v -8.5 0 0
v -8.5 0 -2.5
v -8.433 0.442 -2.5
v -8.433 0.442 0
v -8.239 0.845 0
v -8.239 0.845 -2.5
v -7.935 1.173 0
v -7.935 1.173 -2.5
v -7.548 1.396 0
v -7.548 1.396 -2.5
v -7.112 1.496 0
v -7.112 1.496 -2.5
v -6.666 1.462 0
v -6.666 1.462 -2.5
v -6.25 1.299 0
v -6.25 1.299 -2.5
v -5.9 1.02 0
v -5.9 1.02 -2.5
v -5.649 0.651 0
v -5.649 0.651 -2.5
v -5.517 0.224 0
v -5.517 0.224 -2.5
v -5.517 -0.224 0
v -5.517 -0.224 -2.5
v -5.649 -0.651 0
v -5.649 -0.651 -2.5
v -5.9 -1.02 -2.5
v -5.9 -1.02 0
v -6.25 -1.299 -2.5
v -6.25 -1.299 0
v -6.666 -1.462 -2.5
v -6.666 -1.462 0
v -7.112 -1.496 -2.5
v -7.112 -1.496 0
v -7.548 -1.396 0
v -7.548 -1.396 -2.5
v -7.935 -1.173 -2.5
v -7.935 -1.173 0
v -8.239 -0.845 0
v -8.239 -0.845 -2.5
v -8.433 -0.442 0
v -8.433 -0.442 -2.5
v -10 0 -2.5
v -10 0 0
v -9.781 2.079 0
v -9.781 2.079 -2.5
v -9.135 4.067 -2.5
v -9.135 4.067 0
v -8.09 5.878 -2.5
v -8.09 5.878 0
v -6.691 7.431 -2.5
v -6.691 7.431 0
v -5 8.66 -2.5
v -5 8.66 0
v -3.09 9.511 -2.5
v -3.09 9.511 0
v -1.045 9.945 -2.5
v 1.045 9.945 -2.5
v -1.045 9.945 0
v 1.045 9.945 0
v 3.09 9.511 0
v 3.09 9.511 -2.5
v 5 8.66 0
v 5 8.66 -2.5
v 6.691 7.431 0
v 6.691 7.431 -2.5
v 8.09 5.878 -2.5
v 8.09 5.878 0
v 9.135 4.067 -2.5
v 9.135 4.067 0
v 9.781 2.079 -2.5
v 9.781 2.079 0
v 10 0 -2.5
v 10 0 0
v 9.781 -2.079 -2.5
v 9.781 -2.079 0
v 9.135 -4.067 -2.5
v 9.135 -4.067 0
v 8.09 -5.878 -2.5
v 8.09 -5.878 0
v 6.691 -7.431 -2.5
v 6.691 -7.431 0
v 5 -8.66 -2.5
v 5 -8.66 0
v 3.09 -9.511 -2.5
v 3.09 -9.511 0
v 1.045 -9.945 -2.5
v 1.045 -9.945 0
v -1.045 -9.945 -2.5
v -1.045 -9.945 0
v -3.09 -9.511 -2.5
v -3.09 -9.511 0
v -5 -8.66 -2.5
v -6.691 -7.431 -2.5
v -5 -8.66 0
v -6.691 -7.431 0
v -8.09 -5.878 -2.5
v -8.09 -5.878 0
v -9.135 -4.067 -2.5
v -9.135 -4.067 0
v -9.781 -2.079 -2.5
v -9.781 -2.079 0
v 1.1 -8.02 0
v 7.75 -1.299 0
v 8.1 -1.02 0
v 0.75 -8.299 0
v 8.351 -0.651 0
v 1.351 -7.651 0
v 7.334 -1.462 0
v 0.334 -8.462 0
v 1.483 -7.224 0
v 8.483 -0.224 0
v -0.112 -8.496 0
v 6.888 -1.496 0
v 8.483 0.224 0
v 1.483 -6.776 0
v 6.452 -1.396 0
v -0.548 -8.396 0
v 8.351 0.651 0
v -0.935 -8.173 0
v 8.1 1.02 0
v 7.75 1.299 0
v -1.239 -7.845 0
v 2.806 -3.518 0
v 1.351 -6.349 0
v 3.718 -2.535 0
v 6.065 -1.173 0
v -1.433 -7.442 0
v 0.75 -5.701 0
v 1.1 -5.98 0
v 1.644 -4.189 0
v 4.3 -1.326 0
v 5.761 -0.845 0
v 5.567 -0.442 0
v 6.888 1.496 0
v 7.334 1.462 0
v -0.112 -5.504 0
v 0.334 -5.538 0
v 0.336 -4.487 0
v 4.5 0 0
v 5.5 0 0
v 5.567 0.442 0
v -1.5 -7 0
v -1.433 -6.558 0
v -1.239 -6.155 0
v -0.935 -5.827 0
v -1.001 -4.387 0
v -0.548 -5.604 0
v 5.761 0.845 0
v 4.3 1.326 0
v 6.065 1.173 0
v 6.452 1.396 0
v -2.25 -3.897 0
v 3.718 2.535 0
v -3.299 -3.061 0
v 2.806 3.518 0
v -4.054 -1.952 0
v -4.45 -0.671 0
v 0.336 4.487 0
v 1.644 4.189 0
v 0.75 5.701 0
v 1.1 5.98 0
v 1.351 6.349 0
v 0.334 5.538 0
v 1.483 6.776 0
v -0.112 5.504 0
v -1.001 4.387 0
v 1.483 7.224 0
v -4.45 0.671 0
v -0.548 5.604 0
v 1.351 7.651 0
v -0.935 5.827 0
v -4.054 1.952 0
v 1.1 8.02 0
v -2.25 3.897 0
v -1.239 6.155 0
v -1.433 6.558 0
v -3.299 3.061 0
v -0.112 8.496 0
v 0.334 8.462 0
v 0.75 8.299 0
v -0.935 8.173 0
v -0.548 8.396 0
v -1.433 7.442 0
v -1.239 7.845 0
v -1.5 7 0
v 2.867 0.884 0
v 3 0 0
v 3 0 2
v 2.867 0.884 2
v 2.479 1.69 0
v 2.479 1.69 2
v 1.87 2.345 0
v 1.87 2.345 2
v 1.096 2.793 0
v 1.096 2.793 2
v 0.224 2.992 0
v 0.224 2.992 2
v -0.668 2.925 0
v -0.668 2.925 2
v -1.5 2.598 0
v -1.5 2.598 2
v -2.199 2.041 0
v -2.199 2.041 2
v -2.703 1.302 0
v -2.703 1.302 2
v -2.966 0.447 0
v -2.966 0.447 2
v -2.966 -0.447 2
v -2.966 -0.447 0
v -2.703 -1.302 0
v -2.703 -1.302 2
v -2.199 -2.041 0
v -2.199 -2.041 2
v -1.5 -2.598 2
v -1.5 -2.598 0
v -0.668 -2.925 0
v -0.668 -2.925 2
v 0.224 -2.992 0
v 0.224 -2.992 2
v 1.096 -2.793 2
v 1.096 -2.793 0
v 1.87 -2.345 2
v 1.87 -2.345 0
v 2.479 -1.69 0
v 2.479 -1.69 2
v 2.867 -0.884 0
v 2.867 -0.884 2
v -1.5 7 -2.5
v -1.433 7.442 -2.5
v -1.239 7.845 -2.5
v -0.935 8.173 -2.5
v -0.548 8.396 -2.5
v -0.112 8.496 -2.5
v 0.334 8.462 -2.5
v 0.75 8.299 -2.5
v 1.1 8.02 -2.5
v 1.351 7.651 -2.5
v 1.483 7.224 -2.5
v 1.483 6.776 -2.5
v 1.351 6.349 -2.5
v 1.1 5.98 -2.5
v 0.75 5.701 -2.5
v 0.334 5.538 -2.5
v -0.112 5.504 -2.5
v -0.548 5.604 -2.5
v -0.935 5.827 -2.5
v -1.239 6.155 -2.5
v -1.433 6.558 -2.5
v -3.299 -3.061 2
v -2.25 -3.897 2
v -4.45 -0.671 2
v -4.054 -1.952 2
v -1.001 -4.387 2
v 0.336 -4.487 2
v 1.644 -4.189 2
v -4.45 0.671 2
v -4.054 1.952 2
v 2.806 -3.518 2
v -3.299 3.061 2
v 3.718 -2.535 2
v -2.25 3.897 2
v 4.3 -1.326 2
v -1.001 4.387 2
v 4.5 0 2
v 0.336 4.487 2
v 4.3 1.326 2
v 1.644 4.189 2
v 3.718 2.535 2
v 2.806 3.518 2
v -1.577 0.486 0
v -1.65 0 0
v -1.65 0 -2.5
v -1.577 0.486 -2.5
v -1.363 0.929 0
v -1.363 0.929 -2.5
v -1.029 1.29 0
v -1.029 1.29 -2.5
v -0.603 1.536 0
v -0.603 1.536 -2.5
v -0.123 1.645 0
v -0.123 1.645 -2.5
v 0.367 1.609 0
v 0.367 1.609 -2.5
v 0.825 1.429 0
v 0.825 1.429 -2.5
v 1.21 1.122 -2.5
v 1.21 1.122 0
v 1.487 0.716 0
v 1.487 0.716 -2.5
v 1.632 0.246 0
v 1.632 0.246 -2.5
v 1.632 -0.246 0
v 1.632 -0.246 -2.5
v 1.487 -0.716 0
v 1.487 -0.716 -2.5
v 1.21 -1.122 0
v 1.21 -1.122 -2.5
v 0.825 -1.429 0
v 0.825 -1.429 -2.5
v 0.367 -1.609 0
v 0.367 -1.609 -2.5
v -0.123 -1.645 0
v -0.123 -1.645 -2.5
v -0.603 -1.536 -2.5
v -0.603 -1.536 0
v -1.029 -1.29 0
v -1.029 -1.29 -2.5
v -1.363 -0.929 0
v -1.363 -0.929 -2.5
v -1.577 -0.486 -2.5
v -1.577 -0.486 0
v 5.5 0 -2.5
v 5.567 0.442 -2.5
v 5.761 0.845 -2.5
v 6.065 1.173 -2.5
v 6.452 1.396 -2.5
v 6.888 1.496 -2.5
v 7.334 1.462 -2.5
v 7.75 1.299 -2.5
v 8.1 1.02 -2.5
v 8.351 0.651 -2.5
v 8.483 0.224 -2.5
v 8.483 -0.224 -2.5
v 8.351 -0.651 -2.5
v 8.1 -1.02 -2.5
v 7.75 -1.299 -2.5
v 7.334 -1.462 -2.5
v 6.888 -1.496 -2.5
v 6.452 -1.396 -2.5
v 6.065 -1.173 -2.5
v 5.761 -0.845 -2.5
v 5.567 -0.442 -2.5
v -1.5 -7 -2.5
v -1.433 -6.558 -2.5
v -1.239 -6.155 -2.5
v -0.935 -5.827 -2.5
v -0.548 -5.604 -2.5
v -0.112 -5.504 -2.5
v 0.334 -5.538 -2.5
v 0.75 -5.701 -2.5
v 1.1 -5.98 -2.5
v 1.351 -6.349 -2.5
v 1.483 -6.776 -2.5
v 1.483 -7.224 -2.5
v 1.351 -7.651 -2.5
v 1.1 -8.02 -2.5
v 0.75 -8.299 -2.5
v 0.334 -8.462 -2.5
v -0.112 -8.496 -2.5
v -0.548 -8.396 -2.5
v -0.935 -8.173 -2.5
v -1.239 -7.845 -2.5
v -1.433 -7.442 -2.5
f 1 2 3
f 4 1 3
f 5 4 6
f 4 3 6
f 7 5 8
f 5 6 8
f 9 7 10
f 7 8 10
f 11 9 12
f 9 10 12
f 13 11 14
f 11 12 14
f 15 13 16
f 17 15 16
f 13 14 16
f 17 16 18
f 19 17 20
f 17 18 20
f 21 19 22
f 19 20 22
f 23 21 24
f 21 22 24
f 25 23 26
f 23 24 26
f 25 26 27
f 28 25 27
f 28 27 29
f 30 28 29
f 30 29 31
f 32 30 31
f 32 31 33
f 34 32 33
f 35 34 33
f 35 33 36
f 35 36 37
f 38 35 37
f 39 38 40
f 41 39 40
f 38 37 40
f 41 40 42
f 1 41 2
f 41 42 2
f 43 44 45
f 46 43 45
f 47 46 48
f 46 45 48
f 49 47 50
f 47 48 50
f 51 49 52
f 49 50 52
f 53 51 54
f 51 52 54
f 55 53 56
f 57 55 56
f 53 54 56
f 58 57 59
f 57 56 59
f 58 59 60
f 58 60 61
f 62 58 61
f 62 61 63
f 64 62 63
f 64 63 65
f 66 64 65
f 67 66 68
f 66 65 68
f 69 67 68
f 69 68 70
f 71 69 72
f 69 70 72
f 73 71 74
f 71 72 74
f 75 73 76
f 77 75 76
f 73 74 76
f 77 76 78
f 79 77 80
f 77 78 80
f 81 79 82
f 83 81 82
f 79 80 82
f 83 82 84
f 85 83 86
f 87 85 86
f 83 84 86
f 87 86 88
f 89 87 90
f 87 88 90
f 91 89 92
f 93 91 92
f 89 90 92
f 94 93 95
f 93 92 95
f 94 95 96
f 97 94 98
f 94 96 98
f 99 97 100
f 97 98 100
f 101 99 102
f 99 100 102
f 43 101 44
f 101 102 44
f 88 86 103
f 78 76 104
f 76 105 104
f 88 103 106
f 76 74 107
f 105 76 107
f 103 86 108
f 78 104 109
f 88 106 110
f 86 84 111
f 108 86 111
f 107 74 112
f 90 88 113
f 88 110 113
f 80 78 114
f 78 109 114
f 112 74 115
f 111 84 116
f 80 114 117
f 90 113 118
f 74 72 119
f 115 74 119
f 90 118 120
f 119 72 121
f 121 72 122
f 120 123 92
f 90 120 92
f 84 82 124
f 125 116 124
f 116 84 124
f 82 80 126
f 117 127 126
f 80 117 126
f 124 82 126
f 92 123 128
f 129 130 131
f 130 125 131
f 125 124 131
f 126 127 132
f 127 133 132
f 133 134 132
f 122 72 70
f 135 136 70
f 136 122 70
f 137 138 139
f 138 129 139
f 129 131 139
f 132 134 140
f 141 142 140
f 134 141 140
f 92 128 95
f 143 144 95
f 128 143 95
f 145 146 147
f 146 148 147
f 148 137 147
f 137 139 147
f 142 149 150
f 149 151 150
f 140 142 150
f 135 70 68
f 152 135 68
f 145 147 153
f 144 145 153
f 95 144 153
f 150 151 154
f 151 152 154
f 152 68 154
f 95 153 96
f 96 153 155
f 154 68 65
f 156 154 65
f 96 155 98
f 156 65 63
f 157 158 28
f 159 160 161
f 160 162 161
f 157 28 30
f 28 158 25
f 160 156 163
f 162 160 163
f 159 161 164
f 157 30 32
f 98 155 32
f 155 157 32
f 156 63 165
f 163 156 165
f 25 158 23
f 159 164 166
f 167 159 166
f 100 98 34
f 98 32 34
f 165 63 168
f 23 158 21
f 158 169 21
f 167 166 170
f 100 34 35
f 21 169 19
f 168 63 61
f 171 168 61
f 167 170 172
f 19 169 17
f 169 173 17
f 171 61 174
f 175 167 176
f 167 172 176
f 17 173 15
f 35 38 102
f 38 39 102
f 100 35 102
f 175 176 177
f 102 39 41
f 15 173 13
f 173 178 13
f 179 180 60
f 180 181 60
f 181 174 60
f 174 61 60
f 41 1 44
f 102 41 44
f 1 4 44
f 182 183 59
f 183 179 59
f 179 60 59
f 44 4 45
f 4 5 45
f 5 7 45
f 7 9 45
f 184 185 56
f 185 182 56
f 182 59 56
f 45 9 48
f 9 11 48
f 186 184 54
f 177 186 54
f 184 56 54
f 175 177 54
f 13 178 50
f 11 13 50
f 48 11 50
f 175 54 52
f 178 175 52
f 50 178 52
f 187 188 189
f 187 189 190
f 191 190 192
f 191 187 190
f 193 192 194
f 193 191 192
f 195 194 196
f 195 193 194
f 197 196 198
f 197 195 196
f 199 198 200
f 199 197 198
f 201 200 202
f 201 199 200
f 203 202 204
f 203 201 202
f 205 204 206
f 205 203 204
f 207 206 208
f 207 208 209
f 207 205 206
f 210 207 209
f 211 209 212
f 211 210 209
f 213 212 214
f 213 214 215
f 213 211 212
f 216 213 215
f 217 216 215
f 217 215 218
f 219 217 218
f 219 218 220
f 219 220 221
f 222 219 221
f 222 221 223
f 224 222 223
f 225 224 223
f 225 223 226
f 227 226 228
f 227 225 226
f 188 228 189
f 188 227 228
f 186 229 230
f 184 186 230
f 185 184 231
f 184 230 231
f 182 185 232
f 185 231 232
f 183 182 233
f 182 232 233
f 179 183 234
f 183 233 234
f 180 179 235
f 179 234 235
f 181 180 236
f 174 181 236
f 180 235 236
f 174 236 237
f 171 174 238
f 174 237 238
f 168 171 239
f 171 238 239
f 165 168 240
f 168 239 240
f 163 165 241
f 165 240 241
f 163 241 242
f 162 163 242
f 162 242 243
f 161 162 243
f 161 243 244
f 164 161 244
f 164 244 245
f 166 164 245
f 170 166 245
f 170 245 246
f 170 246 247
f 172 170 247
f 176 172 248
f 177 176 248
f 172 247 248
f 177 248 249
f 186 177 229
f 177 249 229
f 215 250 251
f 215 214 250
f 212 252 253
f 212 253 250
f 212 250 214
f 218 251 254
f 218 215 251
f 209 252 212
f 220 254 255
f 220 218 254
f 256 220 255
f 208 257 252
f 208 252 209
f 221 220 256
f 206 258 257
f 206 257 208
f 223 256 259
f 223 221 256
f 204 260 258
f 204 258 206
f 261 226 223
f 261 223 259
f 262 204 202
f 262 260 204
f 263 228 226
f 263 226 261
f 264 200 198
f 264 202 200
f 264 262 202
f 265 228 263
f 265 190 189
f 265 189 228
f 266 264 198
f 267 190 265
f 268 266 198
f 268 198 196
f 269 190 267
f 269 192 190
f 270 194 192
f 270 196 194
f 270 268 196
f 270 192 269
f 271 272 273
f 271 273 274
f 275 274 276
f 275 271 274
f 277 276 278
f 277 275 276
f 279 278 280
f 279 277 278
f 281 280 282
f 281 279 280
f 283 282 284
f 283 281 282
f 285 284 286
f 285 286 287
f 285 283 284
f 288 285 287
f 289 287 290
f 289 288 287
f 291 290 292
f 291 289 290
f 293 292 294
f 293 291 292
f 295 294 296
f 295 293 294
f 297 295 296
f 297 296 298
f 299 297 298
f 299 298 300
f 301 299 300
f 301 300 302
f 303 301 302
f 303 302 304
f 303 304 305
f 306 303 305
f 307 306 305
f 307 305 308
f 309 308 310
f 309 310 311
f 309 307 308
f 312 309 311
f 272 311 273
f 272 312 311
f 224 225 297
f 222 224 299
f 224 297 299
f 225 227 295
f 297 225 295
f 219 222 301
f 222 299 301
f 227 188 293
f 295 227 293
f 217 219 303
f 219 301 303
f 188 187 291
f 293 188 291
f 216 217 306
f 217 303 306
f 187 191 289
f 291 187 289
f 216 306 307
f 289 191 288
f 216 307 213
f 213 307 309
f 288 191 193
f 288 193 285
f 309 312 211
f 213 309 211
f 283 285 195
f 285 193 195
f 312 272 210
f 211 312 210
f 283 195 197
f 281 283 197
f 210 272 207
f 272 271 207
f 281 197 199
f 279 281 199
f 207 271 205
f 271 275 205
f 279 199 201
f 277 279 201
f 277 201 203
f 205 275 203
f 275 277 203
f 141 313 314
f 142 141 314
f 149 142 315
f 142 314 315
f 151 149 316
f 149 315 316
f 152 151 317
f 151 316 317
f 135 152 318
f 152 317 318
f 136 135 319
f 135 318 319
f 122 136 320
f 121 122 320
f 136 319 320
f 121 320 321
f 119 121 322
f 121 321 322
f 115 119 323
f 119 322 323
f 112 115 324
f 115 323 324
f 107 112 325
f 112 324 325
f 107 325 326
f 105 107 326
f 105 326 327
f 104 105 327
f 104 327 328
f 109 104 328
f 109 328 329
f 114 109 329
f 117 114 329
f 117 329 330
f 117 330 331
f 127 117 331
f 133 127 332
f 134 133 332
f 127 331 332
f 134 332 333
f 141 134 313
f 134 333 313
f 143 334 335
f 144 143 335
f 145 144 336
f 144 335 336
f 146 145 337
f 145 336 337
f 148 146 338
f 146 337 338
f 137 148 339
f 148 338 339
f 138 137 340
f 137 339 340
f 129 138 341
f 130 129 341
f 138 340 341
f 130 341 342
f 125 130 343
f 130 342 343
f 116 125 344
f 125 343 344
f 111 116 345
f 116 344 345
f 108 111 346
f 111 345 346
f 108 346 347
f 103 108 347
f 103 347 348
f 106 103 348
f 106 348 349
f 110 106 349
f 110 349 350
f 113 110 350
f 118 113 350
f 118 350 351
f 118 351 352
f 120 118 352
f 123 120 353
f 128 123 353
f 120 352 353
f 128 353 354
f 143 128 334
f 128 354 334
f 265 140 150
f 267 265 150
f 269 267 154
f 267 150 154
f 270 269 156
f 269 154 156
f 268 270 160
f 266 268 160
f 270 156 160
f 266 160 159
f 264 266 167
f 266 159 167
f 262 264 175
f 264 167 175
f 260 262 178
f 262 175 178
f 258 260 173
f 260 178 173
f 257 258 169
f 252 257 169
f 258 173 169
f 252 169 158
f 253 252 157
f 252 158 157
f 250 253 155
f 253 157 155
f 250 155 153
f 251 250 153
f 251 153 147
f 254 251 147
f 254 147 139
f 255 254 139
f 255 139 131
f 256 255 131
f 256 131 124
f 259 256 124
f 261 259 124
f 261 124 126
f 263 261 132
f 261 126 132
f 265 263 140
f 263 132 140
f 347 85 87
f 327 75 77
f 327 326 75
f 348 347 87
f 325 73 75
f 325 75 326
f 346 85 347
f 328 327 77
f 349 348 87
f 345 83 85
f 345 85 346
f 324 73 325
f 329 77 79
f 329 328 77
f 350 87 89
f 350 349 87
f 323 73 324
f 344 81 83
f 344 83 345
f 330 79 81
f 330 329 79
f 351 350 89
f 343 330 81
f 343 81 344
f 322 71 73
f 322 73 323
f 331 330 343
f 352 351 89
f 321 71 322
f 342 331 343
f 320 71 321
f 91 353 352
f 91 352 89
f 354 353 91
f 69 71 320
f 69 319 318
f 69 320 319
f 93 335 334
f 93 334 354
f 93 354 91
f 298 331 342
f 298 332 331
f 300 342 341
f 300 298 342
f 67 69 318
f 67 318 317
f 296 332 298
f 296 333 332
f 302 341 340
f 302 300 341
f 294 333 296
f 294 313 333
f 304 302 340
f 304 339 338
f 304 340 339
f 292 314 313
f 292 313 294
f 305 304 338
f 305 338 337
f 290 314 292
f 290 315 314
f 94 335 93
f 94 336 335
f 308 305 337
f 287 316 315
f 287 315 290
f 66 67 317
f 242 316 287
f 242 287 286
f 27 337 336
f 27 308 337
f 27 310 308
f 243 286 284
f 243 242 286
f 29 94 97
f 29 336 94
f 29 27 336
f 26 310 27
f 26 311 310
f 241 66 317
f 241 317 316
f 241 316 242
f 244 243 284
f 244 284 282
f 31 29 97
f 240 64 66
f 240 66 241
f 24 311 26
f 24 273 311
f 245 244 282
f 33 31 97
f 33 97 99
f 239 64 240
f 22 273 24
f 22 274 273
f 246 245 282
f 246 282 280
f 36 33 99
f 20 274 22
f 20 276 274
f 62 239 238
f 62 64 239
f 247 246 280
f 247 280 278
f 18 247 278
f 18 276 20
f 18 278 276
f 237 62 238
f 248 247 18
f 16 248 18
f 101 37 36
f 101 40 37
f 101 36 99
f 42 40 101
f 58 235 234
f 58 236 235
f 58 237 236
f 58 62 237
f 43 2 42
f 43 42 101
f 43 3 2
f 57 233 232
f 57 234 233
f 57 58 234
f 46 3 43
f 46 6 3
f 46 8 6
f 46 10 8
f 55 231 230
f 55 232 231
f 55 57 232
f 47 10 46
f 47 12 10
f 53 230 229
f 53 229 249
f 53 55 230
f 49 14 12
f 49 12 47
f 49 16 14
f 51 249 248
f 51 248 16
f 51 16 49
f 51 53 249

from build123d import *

# Parameters (mm, degrees)
SKETCH_1_R          = 4.5
SKETCH_1_R_2        = 3
EXTRUDE_1_DEPTH     = 2
SKETCH_2_R          = 10
SKETCH_2_R_2        = 1.65
EXTRUDE_2_DEPTH     = 2.5
SKETCH_3_R          = 1.5
CUT_EXTRUDE_1_DEPTH = 2.5


with BuildPart() as part:
    # 草图1 → 凸台-拉伸1 (new body)
    with BuildSketch(Plane.XY):
        Circle(SKETCH_1_R)
        Circle(SKETCH_1_R_2, mode=Mode.SUBTRACT)
    extrude(amount=EXTRUDE_1_DEPTH)

    # 草图2 → 凸台-拉伸2 (add)
    with BuildSketch(Plane(origin=(0, 0, 0), x_dir=(-1, 0, 0), z_dir=(0, 0, -1))):
        Circle(SKETCH_2_R)
        Circle(SKETCH_2_R_2, mode=Mode.SUBTRACT)
    extrude(amount=EXTRUDE_2_DEPTH)

    # 草图3 → 切除-拉伸1 (cut)
    with BuildSketch(Plane(origin=(0, 0, -2.5), x_dir=(-1, 0, 0), z_dir=(0, 0, -1))):
        with Locations((7, 0)):
            Circle(SKETCH_3_R)
        with Locations((0, -7)):
            Circle(SKETCH_3_R)
        with Locations((-7, 0)):
            Circle(SKETCH_3_R)
        with Locations((0, 7)):
            Circle(SKETCH_3_R)
    extrude(amount=-CUT_EXTRUDE_1_DEPTH, mode=Mode.SUBTRACT)


solid = part.part
